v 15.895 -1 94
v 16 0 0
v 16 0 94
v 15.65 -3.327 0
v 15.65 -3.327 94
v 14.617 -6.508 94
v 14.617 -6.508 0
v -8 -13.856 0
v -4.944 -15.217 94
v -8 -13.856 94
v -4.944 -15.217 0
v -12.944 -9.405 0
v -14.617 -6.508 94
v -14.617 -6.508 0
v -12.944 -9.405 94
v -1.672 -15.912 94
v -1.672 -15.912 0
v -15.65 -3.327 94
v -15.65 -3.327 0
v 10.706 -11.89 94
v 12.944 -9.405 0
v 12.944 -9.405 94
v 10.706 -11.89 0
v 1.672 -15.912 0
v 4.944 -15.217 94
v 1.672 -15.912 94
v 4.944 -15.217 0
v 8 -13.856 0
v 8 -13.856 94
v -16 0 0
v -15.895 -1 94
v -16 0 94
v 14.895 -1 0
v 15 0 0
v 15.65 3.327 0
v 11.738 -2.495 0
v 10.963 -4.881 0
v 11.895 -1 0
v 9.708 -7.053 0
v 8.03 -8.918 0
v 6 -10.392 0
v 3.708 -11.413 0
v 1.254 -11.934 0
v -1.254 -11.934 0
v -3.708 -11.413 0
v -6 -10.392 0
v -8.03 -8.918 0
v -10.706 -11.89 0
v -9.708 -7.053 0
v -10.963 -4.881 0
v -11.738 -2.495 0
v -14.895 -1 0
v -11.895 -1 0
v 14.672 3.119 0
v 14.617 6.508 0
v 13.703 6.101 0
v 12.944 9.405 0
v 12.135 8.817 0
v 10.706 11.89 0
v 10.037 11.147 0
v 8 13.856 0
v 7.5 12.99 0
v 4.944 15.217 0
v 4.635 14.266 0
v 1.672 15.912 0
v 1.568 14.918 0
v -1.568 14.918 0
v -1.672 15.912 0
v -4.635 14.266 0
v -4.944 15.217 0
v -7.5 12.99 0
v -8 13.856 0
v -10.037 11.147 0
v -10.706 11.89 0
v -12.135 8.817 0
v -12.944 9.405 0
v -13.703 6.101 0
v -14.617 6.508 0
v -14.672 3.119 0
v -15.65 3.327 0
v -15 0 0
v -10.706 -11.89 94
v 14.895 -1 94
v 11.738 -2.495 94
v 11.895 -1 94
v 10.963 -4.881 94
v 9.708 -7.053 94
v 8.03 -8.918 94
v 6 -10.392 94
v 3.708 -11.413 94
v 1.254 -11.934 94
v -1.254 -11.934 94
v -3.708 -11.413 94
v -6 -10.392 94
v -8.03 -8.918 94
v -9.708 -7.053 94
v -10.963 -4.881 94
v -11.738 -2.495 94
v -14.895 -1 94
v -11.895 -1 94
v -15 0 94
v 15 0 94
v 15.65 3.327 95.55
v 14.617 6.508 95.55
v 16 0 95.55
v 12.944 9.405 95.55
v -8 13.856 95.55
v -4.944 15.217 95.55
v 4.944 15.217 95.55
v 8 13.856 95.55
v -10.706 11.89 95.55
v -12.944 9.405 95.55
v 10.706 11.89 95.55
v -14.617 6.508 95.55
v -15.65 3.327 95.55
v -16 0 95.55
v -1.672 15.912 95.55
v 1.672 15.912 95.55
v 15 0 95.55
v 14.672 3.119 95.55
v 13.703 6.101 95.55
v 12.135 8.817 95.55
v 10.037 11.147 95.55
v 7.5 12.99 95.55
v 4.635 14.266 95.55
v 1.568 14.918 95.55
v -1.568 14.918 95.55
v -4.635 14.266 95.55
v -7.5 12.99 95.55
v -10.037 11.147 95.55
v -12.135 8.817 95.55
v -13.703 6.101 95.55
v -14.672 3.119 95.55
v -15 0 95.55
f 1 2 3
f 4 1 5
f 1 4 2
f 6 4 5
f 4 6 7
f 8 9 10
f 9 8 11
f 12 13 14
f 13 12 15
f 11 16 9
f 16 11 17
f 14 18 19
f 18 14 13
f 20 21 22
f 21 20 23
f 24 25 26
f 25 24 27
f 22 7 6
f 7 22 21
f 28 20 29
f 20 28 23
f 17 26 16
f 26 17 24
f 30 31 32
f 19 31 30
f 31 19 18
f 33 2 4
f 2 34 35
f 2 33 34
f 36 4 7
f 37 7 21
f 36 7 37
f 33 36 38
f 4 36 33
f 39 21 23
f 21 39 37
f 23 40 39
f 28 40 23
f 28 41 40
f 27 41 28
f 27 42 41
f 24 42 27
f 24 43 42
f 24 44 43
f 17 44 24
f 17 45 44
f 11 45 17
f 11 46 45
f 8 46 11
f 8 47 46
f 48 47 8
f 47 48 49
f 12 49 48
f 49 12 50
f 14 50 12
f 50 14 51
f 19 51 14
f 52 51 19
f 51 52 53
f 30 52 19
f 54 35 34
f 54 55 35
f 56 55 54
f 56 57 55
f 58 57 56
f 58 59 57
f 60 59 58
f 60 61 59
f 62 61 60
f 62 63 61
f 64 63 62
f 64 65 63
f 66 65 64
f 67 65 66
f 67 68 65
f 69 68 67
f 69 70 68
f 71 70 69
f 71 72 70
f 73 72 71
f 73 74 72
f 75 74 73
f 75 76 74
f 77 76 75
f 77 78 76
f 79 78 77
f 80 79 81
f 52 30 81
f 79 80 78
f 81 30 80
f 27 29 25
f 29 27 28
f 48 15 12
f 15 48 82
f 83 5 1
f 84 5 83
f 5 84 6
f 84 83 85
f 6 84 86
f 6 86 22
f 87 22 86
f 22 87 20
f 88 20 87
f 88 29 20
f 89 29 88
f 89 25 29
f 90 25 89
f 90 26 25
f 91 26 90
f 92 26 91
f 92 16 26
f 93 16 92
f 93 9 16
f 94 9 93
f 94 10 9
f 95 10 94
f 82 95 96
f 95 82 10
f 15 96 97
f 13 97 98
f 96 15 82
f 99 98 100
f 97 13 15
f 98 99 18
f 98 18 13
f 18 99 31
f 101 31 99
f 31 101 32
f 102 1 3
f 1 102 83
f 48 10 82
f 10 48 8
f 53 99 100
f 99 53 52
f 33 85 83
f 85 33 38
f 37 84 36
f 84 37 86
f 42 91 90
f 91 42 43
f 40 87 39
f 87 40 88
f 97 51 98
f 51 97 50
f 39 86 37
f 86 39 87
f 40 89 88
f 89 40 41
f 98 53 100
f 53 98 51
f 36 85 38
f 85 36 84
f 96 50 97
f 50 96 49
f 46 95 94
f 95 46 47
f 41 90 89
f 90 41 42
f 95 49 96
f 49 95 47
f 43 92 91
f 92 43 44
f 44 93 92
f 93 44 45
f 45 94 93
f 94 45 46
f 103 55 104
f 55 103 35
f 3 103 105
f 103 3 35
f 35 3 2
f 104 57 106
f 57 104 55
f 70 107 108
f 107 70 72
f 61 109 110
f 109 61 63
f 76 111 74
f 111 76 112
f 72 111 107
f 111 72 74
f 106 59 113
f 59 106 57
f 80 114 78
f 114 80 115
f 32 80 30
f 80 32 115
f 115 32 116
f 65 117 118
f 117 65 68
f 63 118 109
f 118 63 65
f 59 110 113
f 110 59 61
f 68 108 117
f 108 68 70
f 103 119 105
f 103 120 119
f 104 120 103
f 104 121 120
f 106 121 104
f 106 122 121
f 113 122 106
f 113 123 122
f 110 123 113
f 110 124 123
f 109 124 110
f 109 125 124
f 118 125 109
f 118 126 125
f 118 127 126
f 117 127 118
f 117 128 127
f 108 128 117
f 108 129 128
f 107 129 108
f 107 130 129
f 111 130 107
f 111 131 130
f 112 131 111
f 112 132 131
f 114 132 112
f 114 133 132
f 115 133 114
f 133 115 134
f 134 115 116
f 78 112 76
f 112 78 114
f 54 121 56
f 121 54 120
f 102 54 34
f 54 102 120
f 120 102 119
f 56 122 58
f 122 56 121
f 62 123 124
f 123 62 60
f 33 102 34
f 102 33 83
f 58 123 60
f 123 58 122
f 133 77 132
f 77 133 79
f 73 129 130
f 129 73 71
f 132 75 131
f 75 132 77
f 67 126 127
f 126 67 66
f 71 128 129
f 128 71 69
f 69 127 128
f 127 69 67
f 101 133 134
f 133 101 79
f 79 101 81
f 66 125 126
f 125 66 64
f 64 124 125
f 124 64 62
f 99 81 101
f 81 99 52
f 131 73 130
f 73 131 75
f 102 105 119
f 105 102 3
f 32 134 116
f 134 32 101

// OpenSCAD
filter_tolerance = 1;
coin_radius = 22 / 2;
filter_hole_radius = coin_radius + filter_tolerance;
coin_thickness = 1.55;

filter_radius = 30 / 2;
filter_height = 94;

difference(){
    union(){
        difference(){
            cylinder(h = filter_height, r = filter_radius + filter_tolerance, center = false);
            translate([0, filter_radius-filter_tolerance, 0]){
                cube([(filter_radius + filter_tolerance)*2, filter_radius*2, (filter_height)*2], center = true);
            }
            cylinder(h = filter_height, r = filter_hole_radius, center = false);
        }
        difference(){
            cylinder(h = filter_height + coin_thickness, r = filter_radius+filter_tolerance, center = false);
            cylinder(h = filter_height + coin_thickness, r = filter_radius, center = false);
            translate([0, -(filter_radius+filter_tolerance), filter_height + coin_thickness]){
                cube([(filter_radius + filter_tolerance)*2, (filter_radius+filter_tolerance)*2, (coin_thickness)*2], center = true);
            }
        }
    }
}
